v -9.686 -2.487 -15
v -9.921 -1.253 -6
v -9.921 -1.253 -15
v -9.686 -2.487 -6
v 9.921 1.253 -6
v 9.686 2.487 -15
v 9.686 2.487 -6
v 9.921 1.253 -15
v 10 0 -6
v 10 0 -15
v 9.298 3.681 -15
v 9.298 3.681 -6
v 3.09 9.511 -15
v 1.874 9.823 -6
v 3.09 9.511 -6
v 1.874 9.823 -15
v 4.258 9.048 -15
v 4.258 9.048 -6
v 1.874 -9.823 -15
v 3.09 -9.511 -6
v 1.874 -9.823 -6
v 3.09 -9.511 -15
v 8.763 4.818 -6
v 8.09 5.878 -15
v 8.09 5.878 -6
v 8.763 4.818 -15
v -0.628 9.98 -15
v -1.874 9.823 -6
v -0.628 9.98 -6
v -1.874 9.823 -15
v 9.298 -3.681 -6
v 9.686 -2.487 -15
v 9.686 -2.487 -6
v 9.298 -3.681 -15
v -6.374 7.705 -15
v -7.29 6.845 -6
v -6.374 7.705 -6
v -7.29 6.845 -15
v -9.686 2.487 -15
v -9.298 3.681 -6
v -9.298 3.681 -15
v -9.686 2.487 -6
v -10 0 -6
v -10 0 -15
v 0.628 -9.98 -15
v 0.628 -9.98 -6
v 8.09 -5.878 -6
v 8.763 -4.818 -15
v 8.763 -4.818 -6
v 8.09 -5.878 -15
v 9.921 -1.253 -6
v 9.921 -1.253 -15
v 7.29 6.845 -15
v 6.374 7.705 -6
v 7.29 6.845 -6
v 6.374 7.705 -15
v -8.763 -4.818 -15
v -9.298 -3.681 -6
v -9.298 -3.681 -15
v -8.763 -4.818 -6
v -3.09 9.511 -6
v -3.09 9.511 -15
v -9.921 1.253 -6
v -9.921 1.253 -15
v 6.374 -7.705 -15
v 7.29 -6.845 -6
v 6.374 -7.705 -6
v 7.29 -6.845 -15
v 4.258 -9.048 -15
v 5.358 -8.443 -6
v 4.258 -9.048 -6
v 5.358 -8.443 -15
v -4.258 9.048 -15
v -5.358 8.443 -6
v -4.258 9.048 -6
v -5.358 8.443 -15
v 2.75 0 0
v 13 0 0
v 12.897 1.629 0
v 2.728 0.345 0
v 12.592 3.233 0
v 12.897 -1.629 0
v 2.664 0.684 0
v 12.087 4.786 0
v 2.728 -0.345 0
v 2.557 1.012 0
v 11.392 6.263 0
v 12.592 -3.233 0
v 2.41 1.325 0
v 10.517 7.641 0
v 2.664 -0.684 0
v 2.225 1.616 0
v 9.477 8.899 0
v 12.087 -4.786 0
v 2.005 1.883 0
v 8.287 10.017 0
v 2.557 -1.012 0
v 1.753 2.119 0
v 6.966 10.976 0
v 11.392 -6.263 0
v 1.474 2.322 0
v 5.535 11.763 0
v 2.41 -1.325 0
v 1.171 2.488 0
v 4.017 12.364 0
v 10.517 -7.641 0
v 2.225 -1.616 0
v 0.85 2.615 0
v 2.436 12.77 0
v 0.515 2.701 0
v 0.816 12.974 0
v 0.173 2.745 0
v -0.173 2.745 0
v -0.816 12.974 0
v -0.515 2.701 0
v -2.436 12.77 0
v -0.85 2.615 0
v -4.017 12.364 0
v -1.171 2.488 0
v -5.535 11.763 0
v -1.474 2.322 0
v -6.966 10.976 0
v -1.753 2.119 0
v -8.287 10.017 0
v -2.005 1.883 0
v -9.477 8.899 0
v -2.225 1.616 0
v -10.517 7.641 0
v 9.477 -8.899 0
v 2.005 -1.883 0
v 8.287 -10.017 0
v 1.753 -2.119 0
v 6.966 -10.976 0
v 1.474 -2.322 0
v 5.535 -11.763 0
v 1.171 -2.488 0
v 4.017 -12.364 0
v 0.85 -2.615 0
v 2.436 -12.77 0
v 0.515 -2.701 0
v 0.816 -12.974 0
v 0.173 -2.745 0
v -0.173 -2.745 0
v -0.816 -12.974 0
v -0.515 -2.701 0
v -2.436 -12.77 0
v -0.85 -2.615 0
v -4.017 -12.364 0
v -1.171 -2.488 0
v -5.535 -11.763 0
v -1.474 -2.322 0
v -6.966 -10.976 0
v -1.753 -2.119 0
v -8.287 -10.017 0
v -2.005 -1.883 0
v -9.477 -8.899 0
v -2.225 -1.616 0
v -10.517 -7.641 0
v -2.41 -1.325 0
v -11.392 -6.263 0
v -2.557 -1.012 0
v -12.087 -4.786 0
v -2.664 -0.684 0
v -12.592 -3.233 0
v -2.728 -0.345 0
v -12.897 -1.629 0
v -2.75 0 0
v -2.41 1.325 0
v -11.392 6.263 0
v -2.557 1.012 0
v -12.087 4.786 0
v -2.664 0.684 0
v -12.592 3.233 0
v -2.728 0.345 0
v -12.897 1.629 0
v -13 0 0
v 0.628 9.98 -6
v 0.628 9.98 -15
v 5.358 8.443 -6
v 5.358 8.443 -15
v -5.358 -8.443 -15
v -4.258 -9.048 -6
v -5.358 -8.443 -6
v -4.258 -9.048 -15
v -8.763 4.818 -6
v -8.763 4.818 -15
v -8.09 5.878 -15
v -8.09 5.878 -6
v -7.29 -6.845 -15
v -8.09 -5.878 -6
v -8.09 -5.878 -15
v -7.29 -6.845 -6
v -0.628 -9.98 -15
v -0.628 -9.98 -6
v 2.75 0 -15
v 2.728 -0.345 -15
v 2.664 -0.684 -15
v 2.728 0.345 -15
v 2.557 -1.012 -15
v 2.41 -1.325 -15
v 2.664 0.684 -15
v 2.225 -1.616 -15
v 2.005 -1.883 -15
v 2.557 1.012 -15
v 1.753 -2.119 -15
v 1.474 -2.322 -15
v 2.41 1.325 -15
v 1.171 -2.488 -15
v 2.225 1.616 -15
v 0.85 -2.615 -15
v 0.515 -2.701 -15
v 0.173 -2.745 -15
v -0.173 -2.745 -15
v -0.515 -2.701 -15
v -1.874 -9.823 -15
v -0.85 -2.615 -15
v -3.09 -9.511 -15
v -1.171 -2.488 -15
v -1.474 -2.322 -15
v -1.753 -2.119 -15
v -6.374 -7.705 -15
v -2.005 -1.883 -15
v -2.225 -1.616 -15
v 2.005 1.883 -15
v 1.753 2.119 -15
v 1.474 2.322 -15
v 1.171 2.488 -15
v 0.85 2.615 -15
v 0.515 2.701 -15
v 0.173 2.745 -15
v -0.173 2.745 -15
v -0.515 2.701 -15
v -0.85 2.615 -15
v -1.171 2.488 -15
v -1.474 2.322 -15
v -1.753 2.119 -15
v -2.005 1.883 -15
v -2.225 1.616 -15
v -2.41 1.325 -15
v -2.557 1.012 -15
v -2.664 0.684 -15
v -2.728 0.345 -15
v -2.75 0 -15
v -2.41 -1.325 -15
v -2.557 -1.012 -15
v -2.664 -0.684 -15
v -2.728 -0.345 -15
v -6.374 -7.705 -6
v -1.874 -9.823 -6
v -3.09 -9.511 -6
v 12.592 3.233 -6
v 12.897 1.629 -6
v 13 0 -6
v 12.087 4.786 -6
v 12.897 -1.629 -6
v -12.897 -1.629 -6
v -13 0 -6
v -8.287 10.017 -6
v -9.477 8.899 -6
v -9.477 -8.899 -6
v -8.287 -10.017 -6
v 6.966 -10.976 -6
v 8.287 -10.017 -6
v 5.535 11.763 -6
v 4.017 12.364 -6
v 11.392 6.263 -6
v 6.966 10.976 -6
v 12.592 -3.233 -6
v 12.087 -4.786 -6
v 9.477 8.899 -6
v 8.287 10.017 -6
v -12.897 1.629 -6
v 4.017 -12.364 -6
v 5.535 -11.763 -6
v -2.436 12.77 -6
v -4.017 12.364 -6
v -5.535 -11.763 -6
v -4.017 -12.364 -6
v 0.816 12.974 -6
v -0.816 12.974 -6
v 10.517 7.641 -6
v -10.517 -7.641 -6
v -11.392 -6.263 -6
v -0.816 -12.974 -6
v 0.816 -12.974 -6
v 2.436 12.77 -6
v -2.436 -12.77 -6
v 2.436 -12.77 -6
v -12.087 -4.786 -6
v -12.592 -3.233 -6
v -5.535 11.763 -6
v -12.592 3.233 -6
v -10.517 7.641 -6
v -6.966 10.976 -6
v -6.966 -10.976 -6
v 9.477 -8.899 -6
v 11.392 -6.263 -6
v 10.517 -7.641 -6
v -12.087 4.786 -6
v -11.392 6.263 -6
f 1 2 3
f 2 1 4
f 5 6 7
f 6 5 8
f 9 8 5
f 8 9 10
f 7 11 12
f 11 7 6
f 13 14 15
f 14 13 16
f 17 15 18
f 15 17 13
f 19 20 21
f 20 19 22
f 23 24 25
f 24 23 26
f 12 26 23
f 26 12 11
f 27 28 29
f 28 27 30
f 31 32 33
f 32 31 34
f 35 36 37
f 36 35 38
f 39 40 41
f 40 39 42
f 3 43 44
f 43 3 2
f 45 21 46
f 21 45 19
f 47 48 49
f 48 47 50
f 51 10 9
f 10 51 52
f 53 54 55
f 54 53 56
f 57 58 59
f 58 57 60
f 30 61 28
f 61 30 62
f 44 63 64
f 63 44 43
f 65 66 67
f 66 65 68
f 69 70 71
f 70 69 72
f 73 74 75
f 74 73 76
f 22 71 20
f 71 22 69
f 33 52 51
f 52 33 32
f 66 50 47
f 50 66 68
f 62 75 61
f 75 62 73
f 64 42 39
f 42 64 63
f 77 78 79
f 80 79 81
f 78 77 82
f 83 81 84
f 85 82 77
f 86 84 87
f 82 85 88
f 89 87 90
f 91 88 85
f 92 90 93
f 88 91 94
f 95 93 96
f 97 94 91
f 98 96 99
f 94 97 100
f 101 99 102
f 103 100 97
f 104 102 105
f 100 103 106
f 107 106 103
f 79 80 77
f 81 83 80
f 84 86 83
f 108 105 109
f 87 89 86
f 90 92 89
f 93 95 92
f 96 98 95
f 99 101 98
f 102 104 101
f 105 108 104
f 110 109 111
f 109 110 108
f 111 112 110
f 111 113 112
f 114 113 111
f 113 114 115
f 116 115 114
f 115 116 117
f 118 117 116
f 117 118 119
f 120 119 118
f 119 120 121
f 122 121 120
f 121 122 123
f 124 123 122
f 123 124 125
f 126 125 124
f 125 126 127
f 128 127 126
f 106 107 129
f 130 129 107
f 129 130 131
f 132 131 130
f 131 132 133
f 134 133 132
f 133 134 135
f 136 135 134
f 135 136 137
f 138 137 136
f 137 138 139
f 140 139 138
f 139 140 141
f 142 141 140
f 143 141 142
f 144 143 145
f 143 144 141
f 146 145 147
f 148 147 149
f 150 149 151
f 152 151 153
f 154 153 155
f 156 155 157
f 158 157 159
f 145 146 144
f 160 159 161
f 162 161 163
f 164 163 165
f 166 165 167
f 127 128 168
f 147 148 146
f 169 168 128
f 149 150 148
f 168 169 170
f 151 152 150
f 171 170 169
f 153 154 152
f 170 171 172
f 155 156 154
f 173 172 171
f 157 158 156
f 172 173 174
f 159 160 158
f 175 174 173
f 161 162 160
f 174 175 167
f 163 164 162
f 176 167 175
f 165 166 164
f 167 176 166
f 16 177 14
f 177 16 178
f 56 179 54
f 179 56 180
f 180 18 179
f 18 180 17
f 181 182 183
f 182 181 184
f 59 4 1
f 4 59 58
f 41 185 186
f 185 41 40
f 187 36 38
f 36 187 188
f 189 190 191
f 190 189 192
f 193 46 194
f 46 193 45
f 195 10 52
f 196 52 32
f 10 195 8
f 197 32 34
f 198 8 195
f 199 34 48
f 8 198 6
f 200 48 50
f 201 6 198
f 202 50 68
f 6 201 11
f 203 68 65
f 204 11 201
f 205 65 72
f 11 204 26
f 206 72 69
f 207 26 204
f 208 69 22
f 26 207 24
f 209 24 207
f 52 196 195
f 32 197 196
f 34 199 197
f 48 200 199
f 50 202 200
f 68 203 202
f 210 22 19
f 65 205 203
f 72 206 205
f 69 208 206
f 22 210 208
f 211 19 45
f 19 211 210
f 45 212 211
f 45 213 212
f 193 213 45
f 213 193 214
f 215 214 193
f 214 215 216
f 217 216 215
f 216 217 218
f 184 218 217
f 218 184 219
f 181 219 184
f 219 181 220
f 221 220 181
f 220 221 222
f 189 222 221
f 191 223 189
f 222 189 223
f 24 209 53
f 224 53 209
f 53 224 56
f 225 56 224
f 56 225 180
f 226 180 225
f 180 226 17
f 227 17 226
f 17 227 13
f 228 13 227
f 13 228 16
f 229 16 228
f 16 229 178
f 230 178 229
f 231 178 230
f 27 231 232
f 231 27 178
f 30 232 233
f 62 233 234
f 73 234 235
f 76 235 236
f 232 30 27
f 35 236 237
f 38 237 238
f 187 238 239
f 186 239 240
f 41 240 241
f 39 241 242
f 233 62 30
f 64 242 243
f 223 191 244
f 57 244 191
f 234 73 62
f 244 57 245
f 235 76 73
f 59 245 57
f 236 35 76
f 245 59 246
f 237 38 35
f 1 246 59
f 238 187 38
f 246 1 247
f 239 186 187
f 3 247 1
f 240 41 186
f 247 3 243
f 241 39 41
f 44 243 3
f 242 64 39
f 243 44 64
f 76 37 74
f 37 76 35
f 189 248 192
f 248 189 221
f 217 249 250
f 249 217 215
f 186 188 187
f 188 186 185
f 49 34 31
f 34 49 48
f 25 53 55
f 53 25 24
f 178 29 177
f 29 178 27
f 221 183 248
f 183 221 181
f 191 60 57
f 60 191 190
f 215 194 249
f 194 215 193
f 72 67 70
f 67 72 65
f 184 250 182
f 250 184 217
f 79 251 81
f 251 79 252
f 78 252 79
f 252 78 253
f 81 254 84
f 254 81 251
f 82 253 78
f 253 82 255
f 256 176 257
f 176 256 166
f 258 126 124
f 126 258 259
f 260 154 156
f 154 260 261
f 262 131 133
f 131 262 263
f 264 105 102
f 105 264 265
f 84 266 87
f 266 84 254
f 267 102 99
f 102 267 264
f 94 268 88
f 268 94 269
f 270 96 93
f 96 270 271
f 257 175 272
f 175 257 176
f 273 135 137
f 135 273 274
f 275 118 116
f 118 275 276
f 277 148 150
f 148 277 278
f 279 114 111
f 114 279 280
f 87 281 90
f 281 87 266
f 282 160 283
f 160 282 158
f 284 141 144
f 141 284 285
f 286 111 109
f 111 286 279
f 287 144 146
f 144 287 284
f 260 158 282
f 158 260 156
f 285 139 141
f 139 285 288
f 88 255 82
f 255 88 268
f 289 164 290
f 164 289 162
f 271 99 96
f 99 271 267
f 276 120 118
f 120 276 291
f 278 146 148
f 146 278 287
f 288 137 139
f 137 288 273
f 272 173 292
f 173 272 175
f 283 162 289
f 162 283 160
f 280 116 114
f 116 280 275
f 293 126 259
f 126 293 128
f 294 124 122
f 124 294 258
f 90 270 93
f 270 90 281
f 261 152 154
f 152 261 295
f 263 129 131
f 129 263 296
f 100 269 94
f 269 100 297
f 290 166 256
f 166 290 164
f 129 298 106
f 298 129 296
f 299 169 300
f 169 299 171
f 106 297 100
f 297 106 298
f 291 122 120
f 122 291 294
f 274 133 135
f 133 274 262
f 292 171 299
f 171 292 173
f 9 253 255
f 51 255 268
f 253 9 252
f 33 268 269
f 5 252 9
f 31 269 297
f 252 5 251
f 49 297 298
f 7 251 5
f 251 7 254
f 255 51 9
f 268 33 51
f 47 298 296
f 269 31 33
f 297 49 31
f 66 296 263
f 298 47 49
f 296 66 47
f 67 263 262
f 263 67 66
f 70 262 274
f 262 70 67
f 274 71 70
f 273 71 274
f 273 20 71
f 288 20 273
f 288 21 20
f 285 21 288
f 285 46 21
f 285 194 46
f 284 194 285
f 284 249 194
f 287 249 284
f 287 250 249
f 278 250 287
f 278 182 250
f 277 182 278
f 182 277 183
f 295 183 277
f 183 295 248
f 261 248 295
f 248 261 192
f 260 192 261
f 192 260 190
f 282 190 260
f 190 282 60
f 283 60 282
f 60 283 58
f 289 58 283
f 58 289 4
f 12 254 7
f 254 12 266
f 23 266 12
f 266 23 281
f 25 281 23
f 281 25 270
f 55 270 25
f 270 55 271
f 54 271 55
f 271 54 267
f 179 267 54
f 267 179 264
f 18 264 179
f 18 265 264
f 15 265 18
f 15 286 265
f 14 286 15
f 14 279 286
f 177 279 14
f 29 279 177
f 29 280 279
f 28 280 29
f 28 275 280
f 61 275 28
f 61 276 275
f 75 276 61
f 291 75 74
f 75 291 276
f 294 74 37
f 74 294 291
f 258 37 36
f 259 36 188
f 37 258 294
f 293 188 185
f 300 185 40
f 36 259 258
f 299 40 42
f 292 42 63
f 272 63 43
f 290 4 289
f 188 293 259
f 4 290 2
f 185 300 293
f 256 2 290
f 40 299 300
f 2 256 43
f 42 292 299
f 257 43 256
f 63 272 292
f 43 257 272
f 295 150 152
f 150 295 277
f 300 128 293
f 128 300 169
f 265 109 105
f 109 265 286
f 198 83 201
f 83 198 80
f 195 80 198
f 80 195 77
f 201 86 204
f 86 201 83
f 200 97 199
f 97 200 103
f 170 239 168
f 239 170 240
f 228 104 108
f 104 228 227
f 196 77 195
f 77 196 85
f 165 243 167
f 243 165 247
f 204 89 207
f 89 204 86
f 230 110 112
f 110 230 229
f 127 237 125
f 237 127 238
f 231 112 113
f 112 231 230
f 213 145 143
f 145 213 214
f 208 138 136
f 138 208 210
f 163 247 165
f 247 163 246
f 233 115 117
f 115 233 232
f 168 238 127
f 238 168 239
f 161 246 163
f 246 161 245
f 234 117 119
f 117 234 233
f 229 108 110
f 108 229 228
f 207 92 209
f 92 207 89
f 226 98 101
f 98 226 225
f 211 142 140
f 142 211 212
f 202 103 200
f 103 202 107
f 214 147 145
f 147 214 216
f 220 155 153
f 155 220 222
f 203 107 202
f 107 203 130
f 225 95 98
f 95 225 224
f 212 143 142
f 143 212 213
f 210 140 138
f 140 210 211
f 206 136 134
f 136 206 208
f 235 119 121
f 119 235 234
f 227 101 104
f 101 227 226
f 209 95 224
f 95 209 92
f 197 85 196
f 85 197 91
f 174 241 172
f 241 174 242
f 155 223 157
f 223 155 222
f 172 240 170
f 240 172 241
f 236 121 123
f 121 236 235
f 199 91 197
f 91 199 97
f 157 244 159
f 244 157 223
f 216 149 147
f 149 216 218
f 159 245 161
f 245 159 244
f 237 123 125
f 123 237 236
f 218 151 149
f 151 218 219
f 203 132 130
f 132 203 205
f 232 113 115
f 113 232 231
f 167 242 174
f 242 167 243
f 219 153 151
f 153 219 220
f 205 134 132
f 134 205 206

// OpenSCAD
$fn = 50;


difference() {
	union() {
		translate(v = [0, 0, -15.0000000000]) {
			cylinder(h = 15, r = 10.0000000000);
		}
		translate(v = [0, 0, -6.0000000000]) {
			cylinder(h = 6, r = 13.0000000000);
		}
	}
	union() {
		#translate(v = [0, 0, -15]) {
			cylinder(h = 15, r = 2.7500000000);
		}
	}
}
